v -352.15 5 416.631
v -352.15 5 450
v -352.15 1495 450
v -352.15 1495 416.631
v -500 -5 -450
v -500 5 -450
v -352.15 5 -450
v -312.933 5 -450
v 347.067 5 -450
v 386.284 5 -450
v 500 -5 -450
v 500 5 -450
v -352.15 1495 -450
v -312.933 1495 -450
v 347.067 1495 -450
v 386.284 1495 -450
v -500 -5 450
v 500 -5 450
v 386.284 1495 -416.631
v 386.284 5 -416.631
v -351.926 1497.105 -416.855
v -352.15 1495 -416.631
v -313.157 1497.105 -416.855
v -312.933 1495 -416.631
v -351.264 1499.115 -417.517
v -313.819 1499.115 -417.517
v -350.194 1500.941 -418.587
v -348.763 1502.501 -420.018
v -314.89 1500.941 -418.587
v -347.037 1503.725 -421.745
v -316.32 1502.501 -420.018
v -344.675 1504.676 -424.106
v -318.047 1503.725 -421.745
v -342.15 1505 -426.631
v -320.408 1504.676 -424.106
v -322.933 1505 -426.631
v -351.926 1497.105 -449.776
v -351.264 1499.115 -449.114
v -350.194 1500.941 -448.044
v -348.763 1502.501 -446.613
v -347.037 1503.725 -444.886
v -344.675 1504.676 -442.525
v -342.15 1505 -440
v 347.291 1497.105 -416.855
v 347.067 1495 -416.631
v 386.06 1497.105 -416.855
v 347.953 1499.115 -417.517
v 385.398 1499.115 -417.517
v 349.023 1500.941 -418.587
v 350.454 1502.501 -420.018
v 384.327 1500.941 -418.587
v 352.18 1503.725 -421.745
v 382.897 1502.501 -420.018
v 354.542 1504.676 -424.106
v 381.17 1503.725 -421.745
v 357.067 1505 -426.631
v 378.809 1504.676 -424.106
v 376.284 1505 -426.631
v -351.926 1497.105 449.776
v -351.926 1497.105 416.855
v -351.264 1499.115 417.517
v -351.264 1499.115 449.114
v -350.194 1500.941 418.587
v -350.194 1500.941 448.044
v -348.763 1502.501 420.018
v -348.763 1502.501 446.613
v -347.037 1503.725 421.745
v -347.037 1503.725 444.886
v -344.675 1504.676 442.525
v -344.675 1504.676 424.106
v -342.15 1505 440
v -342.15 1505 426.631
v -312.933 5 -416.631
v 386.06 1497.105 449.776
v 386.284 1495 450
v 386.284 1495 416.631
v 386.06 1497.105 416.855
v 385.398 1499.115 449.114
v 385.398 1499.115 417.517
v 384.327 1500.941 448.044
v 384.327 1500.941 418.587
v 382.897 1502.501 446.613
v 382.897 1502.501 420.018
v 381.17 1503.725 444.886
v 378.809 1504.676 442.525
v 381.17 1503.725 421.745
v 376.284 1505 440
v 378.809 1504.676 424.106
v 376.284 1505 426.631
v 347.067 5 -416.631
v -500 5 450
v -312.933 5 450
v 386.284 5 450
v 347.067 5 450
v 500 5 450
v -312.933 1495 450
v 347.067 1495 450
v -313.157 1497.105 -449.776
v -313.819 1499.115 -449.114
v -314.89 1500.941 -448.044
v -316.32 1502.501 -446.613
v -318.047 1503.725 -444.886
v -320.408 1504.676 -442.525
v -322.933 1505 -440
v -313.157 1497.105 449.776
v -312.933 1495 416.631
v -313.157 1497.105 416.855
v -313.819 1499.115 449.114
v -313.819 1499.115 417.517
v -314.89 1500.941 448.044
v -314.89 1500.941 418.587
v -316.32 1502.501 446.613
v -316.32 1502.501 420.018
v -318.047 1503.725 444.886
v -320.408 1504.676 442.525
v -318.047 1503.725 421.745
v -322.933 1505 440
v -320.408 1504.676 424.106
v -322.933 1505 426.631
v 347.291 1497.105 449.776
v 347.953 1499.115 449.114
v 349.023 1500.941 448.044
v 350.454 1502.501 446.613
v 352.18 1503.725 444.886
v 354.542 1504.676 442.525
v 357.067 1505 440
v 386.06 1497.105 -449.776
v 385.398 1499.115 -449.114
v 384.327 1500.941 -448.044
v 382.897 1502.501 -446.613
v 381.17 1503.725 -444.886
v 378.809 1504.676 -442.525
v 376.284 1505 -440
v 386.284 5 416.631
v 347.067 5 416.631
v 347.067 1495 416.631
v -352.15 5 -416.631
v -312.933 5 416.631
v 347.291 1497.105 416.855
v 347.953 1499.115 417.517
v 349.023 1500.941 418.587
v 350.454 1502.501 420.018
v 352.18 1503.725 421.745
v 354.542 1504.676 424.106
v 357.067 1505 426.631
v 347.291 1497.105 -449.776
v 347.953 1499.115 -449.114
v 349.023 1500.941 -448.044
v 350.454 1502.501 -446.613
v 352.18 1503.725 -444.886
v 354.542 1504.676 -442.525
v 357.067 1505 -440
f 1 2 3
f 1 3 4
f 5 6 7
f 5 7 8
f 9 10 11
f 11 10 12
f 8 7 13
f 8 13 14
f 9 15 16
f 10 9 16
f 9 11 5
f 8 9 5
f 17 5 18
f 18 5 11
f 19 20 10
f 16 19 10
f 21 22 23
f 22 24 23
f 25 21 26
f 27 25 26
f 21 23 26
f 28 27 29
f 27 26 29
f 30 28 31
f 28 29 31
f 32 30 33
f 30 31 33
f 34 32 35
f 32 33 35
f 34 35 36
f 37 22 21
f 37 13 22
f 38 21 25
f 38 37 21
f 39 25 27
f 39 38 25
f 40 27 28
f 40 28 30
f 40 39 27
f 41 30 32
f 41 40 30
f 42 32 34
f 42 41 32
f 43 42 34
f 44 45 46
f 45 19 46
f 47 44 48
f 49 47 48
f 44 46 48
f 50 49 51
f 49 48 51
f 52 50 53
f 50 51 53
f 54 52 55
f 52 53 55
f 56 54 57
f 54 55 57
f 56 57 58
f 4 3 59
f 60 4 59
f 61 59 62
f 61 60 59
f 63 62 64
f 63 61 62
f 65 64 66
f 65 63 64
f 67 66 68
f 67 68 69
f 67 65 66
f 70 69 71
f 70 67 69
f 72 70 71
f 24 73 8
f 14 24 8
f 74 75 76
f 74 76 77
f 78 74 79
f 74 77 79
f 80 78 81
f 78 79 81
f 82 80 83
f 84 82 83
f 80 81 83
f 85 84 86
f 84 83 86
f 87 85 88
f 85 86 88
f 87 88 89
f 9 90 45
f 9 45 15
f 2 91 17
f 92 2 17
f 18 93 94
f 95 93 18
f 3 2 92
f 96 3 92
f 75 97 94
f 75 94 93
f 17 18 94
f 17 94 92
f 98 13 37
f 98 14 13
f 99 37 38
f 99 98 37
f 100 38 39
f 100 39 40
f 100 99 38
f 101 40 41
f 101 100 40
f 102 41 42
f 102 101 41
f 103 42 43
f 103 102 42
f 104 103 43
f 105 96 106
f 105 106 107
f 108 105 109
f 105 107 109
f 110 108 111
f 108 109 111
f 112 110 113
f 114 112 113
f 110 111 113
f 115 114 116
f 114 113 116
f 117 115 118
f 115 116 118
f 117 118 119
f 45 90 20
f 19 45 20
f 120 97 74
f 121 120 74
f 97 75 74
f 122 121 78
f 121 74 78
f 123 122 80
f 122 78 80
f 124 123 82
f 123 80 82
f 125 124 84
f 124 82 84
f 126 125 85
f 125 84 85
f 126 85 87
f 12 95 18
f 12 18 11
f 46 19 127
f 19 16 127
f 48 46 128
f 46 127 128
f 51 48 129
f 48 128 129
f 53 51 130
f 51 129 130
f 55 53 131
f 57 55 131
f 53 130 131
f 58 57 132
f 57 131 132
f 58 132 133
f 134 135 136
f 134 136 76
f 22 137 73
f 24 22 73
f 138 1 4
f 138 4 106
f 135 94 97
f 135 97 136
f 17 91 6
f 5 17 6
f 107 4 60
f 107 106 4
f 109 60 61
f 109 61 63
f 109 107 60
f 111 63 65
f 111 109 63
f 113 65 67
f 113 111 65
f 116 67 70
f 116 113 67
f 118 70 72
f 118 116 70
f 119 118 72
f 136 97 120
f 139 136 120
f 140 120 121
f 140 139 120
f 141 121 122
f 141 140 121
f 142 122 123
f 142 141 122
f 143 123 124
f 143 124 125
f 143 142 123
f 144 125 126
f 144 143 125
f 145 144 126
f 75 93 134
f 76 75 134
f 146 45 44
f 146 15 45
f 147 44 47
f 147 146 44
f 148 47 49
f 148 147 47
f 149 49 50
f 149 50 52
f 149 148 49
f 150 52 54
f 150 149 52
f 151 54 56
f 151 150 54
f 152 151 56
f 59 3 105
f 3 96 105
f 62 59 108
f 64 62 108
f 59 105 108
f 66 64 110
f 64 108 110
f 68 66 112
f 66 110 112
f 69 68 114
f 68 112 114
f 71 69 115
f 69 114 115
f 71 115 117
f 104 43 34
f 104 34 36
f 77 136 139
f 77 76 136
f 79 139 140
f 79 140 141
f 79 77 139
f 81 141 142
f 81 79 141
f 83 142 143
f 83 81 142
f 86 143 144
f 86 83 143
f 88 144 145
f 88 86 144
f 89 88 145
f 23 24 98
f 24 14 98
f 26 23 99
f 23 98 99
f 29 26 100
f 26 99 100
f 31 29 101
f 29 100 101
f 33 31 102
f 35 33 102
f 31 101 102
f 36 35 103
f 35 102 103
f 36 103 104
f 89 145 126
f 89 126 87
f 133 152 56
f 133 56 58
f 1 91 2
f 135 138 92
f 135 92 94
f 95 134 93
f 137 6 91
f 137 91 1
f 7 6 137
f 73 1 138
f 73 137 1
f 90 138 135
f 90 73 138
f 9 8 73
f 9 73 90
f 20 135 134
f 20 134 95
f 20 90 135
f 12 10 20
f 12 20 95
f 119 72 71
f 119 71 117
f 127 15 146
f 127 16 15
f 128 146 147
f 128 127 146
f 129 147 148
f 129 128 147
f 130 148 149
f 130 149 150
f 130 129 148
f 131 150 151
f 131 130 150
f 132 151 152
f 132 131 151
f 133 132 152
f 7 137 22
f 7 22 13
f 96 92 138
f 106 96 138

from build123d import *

# Parameters (mm, degrees)
SKETCH1_W           = 1000
SKETCH1_H           = 900
BOSS_EXTRUDE1_DEPTH = 5
SKETCH2_W           = 39.21699111
SKETCH2_H           = 33.368988095
BOSS_EXTRUDE2_DEPTH = 1500
FILLET1_R           = 10


with BuildPart() as part:
    # Sketch1 → Boss-Extrude1 (new, symmetric)
    with BuildSketch(Plane(origin=(0, 0, 0), x_dir=(1, 0, 0), z_dir=(0, 1, 0))):
        Rectangle(SKETCH1_W, SKETCH1_H)
    extrude(amount=BOSS_EXTRUDE1_DEPTH, both=True)

    # Sketch2 → Boss-Extrude2 (add)
    with BuildSketch(Plane(origin=(0, 5, 0), x_dir=(1, 0, 0), z_dir=(0, 1, 0))):
        with Locations((-332.541820244, -433.315505953)):
            Rectangle(SKETCH2_W, SKETCH2_H)
        with Locations((366.675170866, -433.315505953)):
            Rectangle(SKETCH2_W, SKETCH2_H)
        with Locations((366.675170866, 433.315505953)):
            Rectangle(SKETCH2_W, SKETCH2_H)
        with Locations((-332.541820244, 433.315505953)):
            Rectangle(SKETCH2_W, SKETCH2_H)
    extrude(amount=BOSS_EXTRUDE2_DEPTH)

    # Fillet1
    fillet1_edges = [part.edges().sort_by_distance(p)[0] for p in [
        (-352.150315799, 1505, 433.315505952),
        (-332.541820244, 1505, 450),
        (-312.933324689, 1505, 433.315505952),
        (-332.541820244, 1505, 416.631011905),
        (347.066675311, 1505, 433.315505952),
        (366.675170866, 1505, 450),
        (386.283666421, 1505, 433.315505952),
        (366.675170866, 1505, 416.631011905),
        (366.675170866, 1505, -450),
        (347.066675311, 1505, -433.315505952),
        (366.675170866, 1505, -416.631011905),
        (386.283666421, 1505, -433.315505952),
        (-332.541820244, 1505, -450),
        (-352.150315799, 1505, -433.315505952),
        (-332.541820244, 1505, -416.631011905),
        (-312.933324689, 1505, -433.315505952),
    ]]
    fillet(fillet1_edges, radius=FILLET1_R)


solid = part.part
